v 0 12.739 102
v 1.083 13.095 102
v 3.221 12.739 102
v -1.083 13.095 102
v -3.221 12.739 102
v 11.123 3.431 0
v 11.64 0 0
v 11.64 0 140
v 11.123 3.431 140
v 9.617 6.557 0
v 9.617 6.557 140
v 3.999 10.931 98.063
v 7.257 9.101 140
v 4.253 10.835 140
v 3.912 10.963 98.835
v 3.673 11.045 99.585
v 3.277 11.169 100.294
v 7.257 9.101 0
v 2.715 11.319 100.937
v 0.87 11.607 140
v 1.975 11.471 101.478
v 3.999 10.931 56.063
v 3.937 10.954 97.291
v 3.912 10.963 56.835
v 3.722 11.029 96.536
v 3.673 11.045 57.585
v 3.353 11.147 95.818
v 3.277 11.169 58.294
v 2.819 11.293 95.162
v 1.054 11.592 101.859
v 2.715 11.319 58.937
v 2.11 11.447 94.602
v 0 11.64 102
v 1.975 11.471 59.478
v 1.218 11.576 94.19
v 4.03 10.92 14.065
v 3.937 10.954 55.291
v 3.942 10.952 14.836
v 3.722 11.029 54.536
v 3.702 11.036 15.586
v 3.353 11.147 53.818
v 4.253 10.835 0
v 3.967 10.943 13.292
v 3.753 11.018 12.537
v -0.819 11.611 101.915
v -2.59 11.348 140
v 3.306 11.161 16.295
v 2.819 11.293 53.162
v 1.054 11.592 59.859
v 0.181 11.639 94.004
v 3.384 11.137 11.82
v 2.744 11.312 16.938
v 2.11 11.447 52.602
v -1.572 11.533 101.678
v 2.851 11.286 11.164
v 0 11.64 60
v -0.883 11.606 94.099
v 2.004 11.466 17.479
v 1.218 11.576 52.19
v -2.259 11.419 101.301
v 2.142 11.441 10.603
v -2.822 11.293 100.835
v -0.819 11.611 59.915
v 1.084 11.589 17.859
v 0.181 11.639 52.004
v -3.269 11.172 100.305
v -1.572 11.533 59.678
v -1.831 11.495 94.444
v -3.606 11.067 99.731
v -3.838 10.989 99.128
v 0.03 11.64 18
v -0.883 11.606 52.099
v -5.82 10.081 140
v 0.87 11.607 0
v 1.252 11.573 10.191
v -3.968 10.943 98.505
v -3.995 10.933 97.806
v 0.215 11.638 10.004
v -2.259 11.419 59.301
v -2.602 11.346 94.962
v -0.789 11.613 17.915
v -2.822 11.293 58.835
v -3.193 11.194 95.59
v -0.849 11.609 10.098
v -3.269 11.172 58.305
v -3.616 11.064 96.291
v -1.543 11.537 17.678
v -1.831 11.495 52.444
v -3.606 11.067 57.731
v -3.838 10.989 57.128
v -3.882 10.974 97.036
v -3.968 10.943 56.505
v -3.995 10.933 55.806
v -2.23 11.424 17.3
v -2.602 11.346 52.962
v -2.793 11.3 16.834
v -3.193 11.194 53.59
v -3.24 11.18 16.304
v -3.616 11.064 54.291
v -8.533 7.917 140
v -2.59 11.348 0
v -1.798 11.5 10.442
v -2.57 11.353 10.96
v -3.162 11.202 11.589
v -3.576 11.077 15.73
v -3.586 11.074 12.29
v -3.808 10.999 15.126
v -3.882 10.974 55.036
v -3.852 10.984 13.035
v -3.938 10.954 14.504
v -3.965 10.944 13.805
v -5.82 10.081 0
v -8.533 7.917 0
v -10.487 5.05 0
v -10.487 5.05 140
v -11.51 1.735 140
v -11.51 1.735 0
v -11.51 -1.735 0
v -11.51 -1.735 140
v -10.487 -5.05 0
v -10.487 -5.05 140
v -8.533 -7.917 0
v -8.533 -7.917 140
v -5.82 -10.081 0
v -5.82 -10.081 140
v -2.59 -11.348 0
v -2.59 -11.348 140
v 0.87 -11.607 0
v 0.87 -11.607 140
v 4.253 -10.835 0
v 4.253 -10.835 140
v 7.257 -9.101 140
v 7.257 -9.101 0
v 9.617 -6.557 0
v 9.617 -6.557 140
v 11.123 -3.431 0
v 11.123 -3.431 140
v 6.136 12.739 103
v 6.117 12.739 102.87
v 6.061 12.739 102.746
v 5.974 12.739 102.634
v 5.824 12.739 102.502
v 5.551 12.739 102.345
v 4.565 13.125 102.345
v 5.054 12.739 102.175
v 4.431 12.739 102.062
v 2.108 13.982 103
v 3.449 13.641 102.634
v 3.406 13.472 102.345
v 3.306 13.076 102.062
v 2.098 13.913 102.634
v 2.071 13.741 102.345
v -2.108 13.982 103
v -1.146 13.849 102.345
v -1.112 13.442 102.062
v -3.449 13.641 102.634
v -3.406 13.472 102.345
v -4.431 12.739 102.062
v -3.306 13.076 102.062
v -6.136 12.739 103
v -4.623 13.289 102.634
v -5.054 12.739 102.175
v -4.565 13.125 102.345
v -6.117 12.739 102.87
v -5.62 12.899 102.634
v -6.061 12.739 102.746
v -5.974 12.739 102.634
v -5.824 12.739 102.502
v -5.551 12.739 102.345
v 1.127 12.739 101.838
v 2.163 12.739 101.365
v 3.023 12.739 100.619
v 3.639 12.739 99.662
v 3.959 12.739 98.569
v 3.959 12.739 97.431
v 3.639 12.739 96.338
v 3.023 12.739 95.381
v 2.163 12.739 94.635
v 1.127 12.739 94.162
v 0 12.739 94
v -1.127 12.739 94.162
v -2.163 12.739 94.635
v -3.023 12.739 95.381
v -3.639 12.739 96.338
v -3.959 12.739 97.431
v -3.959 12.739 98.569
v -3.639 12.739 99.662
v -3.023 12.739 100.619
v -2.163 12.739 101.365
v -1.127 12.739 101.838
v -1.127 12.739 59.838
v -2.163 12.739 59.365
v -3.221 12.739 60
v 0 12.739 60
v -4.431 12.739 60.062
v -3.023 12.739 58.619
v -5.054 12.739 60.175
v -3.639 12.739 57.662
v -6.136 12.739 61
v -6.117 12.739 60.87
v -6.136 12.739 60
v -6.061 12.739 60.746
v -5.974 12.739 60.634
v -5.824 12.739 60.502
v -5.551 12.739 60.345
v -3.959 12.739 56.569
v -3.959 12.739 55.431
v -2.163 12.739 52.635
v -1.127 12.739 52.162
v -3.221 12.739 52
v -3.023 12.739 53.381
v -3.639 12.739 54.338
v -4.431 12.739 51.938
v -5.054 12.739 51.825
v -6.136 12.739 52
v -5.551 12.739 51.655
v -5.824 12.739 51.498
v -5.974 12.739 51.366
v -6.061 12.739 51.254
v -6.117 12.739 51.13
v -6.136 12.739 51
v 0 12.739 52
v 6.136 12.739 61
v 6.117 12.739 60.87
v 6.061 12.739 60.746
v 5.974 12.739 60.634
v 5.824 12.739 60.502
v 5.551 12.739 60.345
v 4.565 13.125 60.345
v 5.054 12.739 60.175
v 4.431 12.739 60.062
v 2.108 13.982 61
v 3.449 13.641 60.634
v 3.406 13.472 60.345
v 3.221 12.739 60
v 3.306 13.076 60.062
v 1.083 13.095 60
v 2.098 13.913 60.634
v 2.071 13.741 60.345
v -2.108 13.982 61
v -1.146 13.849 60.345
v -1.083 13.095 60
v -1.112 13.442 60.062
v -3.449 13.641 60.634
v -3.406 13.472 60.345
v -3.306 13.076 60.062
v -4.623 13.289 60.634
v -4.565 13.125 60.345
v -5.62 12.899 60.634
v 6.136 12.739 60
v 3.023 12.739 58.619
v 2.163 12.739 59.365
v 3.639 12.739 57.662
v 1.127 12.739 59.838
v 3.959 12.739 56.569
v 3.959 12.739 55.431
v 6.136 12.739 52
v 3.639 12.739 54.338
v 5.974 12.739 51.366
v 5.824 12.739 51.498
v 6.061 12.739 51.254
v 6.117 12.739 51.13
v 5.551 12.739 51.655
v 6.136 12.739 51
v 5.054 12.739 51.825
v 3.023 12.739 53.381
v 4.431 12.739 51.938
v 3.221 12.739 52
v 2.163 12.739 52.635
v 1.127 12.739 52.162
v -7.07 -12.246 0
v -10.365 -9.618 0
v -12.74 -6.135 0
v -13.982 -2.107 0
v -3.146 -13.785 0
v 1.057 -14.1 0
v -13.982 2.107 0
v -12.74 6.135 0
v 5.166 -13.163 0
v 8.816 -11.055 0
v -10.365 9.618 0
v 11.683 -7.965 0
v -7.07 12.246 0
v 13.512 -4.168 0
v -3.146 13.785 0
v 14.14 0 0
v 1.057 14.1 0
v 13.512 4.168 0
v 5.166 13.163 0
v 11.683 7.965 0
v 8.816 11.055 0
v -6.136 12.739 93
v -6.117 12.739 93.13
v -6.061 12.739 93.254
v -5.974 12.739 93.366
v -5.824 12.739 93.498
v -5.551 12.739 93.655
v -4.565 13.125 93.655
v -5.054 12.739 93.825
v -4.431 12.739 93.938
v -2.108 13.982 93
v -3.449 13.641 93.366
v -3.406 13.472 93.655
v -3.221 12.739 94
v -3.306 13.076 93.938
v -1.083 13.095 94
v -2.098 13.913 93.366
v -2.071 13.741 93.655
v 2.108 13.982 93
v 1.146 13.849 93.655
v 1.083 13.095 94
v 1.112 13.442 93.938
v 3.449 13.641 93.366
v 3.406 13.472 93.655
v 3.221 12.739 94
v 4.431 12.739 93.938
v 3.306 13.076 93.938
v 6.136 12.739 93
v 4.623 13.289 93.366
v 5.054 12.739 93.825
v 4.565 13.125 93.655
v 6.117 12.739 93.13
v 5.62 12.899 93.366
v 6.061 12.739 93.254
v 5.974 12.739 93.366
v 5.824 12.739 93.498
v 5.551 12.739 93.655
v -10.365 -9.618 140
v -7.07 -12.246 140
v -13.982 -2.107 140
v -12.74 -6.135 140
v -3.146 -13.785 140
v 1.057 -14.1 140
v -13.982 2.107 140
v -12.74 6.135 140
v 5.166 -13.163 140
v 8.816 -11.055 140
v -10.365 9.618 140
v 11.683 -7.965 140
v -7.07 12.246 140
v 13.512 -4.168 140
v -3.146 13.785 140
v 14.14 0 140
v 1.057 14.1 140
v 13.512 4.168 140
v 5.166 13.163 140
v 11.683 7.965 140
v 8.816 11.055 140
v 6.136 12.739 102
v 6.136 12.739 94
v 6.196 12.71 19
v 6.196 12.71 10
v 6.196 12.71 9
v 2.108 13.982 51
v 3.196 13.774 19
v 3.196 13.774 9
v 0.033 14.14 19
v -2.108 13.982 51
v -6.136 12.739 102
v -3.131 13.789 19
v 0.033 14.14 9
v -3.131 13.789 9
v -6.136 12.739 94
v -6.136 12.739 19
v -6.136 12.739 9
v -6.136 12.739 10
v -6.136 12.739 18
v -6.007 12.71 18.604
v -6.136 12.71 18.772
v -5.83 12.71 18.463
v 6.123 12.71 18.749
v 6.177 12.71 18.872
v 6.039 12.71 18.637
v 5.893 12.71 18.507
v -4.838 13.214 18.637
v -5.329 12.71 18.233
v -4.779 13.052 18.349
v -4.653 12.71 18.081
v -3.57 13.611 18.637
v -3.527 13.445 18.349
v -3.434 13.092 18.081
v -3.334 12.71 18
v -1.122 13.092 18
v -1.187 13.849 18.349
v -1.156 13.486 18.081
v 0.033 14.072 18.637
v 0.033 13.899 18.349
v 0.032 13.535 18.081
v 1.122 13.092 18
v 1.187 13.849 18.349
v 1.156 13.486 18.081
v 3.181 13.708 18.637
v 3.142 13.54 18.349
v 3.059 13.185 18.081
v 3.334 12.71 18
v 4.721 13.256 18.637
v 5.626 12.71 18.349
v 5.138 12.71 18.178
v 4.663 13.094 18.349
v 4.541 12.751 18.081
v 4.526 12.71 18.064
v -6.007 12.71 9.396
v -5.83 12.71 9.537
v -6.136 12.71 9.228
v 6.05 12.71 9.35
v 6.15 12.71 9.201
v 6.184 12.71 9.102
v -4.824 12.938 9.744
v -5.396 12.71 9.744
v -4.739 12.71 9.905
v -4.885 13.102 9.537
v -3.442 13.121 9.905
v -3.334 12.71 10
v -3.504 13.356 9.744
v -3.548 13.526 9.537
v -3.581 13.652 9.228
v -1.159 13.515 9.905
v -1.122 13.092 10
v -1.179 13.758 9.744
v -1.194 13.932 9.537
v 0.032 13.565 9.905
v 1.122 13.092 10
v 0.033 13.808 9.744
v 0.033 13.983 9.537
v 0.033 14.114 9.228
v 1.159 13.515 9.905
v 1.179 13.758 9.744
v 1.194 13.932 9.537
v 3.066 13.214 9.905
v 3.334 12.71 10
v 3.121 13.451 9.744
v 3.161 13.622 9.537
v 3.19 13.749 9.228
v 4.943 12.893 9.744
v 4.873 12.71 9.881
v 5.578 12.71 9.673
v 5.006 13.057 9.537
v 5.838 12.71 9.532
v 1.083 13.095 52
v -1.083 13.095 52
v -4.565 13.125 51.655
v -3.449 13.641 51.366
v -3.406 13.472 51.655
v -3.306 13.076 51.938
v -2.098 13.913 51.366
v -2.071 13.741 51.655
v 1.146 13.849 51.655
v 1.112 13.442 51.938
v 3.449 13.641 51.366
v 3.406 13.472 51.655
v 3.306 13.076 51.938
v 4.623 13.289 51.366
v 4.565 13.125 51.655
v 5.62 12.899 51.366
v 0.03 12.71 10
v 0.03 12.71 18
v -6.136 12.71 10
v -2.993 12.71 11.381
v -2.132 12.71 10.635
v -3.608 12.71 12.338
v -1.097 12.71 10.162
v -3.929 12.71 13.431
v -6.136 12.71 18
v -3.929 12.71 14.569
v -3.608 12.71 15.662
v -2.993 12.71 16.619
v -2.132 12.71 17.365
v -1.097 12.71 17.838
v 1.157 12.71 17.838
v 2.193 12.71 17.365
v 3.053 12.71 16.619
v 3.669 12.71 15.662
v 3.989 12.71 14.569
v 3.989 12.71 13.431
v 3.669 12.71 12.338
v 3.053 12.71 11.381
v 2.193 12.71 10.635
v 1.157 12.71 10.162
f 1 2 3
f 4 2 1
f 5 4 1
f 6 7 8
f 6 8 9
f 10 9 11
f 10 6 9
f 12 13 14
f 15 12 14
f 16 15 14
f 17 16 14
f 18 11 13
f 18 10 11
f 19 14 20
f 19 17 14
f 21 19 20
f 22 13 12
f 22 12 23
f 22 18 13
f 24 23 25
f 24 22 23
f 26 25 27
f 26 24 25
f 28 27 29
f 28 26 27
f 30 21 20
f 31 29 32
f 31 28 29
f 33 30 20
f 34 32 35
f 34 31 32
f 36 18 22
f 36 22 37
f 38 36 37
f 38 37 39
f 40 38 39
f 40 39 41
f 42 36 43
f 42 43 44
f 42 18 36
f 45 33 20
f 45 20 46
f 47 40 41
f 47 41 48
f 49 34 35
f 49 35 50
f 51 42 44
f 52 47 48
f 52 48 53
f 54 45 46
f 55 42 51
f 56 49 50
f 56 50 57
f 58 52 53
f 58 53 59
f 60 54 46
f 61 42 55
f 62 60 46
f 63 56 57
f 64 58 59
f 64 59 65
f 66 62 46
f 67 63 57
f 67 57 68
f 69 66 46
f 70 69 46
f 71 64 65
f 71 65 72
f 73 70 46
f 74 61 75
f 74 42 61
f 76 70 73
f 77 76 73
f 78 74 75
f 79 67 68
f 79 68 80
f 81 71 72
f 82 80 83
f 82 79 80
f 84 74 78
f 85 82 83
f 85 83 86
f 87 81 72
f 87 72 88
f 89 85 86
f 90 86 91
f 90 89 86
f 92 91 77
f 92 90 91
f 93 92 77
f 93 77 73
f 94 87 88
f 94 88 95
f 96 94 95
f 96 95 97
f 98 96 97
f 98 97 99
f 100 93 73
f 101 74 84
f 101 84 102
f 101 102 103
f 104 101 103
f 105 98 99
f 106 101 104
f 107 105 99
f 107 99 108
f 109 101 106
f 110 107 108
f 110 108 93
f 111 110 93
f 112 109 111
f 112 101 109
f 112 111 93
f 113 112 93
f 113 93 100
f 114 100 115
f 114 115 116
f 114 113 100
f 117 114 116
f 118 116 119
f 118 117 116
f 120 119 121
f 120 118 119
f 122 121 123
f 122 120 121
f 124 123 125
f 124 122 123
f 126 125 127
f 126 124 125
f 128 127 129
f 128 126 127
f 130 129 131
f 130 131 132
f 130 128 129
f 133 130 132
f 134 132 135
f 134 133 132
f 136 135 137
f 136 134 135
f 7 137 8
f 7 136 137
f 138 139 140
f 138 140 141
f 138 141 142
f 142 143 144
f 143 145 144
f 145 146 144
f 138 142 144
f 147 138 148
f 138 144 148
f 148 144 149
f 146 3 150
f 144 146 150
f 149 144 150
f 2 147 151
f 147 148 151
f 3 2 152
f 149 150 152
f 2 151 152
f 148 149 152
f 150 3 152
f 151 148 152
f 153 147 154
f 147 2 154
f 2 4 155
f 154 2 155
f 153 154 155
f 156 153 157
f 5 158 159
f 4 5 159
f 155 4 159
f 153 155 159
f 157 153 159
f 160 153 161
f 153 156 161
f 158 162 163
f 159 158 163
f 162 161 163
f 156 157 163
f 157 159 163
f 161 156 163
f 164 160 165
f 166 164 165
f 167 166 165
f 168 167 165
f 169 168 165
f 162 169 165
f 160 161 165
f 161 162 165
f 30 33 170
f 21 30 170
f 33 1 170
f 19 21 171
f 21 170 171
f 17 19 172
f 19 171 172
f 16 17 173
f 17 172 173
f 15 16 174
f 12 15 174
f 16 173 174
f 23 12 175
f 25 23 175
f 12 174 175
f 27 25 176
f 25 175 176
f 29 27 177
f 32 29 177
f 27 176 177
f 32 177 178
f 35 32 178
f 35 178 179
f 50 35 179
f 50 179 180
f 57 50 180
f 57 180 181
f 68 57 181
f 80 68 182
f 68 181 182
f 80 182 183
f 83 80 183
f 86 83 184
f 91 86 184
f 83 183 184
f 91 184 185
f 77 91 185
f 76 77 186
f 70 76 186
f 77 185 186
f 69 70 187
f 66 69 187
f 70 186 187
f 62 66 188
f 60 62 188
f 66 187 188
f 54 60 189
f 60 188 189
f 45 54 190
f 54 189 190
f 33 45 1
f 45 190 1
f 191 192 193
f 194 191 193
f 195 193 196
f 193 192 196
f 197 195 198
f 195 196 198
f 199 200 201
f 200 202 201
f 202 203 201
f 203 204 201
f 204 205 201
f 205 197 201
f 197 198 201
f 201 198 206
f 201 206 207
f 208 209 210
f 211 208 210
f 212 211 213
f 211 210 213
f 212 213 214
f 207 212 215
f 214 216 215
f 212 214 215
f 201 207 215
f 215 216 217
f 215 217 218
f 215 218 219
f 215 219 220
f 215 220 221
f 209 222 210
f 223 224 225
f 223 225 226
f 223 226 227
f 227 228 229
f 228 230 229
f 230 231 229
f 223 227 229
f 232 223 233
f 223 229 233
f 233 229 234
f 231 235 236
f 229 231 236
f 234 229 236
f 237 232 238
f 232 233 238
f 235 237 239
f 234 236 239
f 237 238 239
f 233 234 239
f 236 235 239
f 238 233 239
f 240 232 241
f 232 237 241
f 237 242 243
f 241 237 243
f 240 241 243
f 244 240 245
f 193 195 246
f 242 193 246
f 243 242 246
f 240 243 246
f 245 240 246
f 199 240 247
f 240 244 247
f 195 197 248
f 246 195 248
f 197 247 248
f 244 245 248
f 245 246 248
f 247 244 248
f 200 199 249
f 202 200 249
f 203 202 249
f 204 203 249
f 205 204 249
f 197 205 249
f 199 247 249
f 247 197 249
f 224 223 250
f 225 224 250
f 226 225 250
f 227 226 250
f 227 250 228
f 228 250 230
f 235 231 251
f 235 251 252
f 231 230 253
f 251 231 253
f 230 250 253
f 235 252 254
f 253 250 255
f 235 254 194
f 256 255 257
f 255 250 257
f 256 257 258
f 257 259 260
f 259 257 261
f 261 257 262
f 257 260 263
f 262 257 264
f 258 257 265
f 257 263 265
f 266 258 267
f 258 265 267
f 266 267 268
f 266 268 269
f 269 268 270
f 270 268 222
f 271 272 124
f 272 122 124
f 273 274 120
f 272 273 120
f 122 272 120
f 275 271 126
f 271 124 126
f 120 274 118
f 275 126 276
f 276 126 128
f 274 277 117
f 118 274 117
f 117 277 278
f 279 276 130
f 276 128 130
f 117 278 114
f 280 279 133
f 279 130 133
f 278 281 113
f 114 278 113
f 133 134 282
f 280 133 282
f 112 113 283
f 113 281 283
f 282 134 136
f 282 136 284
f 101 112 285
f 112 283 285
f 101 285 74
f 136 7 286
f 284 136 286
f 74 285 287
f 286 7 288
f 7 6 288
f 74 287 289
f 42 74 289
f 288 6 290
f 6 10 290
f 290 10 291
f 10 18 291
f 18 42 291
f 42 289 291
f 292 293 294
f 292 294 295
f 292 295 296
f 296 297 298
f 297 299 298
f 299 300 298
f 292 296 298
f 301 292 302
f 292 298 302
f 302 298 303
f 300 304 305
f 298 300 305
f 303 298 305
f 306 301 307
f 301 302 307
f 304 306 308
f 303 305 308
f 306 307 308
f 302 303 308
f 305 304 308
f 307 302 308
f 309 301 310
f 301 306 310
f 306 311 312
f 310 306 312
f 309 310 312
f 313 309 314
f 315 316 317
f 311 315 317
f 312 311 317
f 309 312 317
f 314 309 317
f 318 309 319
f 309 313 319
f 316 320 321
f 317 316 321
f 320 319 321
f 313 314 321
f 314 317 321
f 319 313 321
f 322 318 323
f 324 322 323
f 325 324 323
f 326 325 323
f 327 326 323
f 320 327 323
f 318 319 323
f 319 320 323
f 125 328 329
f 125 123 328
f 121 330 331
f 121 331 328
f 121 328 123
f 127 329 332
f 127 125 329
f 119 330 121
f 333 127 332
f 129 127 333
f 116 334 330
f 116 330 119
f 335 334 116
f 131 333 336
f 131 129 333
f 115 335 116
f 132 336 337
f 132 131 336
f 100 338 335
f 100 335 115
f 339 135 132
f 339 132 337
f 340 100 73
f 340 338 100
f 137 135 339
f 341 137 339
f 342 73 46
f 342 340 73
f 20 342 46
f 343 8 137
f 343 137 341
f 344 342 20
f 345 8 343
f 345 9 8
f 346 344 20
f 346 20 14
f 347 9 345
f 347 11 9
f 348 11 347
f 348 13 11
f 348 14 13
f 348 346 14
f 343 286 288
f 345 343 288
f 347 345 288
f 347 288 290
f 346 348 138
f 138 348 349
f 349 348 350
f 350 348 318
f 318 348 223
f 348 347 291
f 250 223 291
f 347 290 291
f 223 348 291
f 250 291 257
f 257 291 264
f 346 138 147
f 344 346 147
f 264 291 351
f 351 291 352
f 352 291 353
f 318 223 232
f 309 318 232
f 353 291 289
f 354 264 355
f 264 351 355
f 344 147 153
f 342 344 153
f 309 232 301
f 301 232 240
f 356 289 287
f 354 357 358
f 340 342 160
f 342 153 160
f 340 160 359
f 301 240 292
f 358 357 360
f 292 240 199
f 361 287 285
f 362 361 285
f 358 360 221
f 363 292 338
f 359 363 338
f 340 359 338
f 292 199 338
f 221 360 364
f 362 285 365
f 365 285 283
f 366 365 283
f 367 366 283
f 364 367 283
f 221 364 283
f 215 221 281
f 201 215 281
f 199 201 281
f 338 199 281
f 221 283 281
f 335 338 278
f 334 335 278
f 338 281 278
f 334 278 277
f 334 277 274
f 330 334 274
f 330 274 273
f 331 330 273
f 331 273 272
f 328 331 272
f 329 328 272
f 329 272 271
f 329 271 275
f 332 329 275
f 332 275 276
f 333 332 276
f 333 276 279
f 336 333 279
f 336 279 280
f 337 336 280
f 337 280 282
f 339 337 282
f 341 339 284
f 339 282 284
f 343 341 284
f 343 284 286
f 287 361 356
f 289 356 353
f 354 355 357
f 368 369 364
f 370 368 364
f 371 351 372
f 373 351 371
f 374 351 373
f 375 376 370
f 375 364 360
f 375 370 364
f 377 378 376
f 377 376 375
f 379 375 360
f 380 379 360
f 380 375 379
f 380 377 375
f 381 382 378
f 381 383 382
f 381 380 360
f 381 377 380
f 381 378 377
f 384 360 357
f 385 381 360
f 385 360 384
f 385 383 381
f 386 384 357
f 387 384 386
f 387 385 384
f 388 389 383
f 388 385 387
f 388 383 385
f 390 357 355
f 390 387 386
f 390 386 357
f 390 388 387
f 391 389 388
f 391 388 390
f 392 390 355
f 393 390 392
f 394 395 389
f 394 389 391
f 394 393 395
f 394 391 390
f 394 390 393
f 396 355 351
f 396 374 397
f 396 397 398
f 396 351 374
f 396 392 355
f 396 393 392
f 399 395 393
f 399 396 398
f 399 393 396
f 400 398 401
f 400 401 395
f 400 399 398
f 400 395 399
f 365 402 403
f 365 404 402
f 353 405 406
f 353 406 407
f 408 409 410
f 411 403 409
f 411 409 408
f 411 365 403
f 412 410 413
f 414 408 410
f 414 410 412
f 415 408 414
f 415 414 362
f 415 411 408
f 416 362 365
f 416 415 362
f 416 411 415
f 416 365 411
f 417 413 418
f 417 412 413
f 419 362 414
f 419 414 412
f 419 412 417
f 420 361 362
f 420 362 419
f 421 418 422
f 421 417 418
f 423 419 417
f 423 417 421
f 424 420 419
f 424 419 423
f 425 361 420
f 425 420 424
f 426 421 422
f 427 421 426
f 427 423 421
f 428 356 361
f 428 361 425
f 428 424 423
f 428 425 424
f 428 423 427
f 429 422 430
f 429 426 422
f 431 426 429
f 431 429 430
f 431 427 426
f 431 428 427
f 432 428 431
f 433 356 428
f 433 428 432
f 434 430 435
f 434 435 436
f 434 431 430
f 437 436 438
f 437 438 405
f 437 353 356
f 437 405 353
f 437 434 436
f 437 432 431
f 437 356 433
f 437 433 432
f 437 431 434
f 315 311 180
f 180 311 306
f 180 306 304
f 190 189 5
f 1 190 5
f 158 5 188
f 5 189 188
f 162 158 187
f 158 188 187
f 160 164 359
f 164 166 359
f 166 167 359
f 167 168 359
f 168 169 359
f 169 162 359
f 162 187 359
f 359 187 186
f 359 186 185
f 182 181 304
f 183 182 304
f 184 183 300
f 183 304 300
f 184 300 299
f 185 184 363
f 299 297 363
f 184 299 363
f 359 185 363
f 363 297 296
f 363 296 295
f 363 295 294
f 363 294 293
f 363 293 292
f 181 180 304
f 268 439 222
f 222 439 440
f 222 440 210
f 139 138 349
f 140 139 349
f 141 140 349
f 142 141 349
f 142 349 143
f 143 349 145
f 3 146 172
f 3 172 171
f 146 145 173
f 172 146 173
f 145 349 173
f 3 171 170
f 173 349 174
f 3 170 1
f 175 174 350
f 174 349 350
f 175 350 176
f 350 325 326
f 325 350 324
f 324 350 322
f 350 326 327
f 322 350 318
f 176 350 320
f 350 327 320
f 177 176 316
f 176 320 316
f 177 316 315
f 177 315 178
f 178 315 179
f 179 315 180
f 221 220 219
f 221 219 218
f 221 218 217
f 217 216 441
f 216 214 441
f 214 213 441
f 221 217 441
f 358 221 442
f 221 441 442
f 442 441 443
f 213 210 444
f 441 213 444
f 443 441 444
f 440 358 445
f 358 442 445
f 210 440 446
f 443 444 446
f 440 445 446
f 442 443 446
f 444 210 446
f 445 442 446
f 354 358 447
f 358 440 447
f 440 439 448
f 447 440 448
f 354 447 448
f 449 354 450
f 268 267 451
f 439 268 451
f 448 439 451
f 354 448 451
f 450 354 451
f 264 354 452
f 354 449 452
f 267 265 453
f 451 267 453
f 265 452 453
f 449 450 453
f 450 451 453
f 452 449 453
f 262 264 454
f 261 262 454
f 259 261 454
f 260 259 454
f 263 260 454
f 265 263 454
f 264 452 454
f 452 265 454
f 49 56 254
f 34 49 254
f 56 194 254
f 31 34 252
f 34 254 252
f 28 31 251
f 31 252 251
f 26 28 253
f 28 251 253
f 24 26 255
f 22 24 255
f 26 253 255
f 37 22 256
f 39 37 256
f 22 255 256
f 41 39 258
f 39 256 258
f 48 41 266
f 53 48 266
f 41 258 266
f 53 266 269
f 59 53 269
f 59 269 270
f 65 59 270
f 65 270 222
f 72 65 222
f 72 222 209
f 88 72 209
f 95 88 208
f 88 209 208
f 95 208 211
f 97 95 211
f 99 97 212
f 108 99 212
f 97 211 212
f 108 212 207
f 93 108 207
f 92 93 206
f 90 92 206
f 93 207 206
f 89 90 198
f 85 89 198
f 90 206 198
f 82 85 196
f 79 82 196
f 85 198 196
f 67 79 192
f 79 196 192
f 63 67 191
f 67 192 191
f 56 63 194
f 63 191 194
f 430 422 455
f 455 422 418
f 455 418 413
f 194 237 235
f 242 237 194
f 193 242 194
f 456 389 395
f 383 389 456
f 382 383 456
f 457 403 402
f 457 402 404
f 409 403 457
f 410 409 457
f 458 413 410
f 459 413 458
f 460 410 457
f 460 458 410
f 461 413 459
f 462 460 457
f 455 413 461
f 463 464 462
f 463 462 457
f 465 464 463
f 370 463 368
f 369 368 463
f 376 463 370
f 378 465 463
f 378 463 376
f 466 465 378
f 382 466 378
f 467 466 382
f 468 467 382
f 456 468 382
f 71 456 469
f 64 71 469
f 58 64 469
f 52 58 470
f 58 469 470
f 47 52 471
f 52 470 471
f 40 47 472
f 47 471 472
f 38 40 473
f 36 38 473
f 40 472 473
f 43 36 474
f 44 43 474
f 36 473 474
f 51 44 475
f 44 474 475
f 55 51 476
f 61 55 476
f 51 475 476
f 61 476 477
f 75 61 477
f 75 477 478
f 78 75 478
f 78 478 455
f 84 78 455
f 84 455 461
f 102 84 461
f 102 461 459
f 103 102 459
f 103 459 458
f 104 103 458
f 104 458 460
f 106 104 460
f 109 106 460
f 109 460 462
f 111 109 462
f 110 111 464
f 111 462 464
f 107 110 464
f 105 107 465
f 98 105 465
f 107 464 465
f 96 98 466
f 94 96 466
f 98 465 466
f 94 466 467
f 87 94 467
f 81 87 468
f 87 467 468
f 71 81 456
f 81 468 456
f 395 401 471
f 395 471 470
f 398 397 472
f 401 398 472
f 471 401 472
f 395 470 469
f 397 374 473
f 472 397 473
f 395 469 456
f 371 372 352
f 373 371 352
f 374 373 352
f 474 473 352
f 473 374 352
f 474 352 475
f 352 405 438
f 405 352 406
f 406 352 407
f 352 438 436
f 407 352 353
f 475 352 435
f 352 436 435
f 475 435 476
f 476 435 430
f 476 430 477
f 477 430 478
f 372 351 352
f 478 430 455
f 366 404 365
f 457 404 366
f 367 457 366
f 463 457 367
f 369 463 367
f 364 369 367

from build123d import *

# Parameters (mm, degrees)
SKETCH1_R              = 14.14
SKETCH1_R_2            = 11.64
BOSS_EXTRUDE1_DEPTH    = 140
SKETCH2_W              = 12.332677781
SKETCH2_H              = 2.901386509
CUT_EXTRUDE1_DEPTH     = 8
SKETCH3_R              = 4
CUT_EXTRUDE2_DEPTH     = 10
FILLET1_R              = 1
SKETCH4_W              = 12.27253506
SKETCH4_H              = 2.991853872
CUT_EXTRUDE3_DEPTH     = 4
SKETCH5_R              = 4
CUT_EXTRUDE4_DEPTH     = 4
FILLET2_R              = 1
LPATTERN1_COUNT        = 2
LPATTERN1_PITCH        = 42
FILLET2_OF_LPATTERN1_R = 1


with BuildPart() as part:
    # Sketch1 → Boss-Extrude1 (new body)
    with BuildSketch(Plane.XY):
        Circle(SKETCH1_R)
        Circle(SKETCH1_R_2, mode=Mode.SUBTRACT)
    extrude(amount=BOSS_EXTRUDE1_DEPTH)

    # Sketch2 → Cut-Extrude1 (cut)
    with BuildSketch(Plane(origin=(0, 0, 10), x_dir=(-1, 0, 0), z_dir=(0, 0, -1))):
        with Locations((-0.030071361, 14.160693254)):
            Rectangle(SKETCH2_W, SKETCH2_H)
    extrude(amount=-CUT_EXTRUDE1_DEPTH, mode=Mode.SUBTRACT)

    # Sketch3 → Cut-Extrude2 (cut)
    with BuildSketch(Plane(origin=(0, 12.71, 0), x_dir=(1, 0, 0), z_dir=(0, 1, 0))):
        with Locations(Location((0.030071361, -14, 0), (0, 0, 270))):
            Circle(SKETCH3_R)
    extrude(amount=-CUT_EXTRUDE2_DEPTH, mode=Mode.SUBTRACT)

    # Fillet1
    # the kernel refuses this fillet: 1 mm, written as the material it takes off along each edge
    with BuildSketch(Plane(origin=(0, 0, 10), x_dir=(-0.585677911723241, 0.8105438814274669, 0), z_dir=(-0.8105438814274669, -0.585677911723241, 0))) as fillet1_piece_1_section:
        with BuildLine():
            CenterArc((14.14 - FILLET1_R, FILLET1_R), FILLET1_R, 270, 90)
            Line((14.14 - FILLET1_R, 0), (14.14, 0))
            Line((14.14, 0), (14.14, FILLET1_R))
        make_face()
    fillet1_piece_1 = revolve(axis=Axis((0, 0, 10), (0, 0, -1)), revolution_arc=71.972599758, mode=Mode.PRIVATE)
    fillet1_piece_1 = split(fillet1_piece_1, bisect_by=Plane(origin=(0.026539027, 12.71, 9.717258604), z_dir=(0, 1, 0)), keep=Keep.TOP, mode=Mode.PRIVATE)
    fillet1_piece_1 = split(fillet1_piece_1, bisect_by=Plane(origin=(-6.13626753, 13.857233191, 9.717258604), z_dir=(1, 0, 0)), keep=Keep.TOP, mode=Mode.PRIVATE)
    add(fillet1_piece_1, mode=Mode.SUBTRACT)
    with BuildSketch(Plane(origin=(0, 0, 18), x_dir=(-0.585677911723241, 0.8105438814274669, 0), z_dir=(-0.8105438814274669, -0.585677911723241, 0))) as fillet1_piece_2_section:
        with BuildLine():
            CenterArc((14.14 - FILLET1_R, -FILLET1_R), FILLET1_R, 0, 90)
            Line((14.14 - FILLET1_R, 0), (14.14, 0))
            Line((14.14, 0), (14.14, -FILLET1_R))
        make_face()
    fillet1_piece_2 = revolve(axis=Axis((0, 0, 18), (0, 0, -1)), revolution_arc=71.972599758, mode=Mode.PRIVATE)
    fillet1_piece_2 = split(fillet1_piece_2, bisect_by=Plane(origin=(0.026539027, 12.71, 18.282741396), z_dir=(0, 1, 0)), keep=Keep.TOP, mode=Mode.PRIVATE)
    fillet1_piece_2 = split(fillet1_piece_2, bisect_by=Plane(origin=(-6.13626753, 13.857233191, 18.282741396), z_dir=(1, 0, 0)), keep=Keep.TOP, mode=Mode.PRIVATE)
    add(fillet1_piece_2, mode=Mode.SUBTRACT)

    # Sketch4 → Cut-Extrude3 (cut, symmetric)
    with BuildSketch(Plane(origin=(0, 0, 56), x_dir=(-1, 0, 0), z_dir=(0, 0, -1))):
        with Locations((0, 14.235072151)):
            Rectangle(SKETCH4_W, SKETCH4_H)
    cut_extrude3 = extrude(amount=CUT_EXTRUDE3_DEPTH, both=True, mode=Mode.SUBTRACT)

    # Sketch5 → Cut-Extrude4 (cut, symmetric)
    with BuildSketch(Plane(origin=(0, 12.739145215, 0), x_dir=(1, 0, 0), z_dir=(0, 1, 0))):
        with Locations(Location((0, -56, 0), (0, 0, 270))):
            Circle(SKETCH5_R)
    cut_extrude4 = extrude(amount=CUT_EXTRUDE4_DEPTH, both=True, mode=Mode.SUBTRACT)

    # Fillet2
    fillet2_edges = [part.edges().sort_by_distance(p)[0] for p in [
        (0, 14.14, 52),
        (0, 14.14, 60),
    ]]
    fillet(fillet2_edges, radius=FILLET2_R)

    # LPattern1: Cut-Extrude3, Cut-Extrude4 ×2
    with Locations(*[(0, 0, i * LPATTERN1_PITCH) for i in range(1, LPATTERN1_COUNT)]):
        add(cut_extrude3, mode=Mode.SUBTRACT)
        add(cut_extrude4, mode=Mode.SUBTRACT)

    # Fillet2 of LPattern1
    fillet2_of_lpattern1_edges = [part.edges().sort_by_distance(p)[0] for p in [
        (0, 14.14, 94),
        (0, 14.14, 102),
    ]]
    fillet(fillet2_of_lpattern1_edges, radius=FILLET2_OF_LPATTERN1_R)


solid = part.part
